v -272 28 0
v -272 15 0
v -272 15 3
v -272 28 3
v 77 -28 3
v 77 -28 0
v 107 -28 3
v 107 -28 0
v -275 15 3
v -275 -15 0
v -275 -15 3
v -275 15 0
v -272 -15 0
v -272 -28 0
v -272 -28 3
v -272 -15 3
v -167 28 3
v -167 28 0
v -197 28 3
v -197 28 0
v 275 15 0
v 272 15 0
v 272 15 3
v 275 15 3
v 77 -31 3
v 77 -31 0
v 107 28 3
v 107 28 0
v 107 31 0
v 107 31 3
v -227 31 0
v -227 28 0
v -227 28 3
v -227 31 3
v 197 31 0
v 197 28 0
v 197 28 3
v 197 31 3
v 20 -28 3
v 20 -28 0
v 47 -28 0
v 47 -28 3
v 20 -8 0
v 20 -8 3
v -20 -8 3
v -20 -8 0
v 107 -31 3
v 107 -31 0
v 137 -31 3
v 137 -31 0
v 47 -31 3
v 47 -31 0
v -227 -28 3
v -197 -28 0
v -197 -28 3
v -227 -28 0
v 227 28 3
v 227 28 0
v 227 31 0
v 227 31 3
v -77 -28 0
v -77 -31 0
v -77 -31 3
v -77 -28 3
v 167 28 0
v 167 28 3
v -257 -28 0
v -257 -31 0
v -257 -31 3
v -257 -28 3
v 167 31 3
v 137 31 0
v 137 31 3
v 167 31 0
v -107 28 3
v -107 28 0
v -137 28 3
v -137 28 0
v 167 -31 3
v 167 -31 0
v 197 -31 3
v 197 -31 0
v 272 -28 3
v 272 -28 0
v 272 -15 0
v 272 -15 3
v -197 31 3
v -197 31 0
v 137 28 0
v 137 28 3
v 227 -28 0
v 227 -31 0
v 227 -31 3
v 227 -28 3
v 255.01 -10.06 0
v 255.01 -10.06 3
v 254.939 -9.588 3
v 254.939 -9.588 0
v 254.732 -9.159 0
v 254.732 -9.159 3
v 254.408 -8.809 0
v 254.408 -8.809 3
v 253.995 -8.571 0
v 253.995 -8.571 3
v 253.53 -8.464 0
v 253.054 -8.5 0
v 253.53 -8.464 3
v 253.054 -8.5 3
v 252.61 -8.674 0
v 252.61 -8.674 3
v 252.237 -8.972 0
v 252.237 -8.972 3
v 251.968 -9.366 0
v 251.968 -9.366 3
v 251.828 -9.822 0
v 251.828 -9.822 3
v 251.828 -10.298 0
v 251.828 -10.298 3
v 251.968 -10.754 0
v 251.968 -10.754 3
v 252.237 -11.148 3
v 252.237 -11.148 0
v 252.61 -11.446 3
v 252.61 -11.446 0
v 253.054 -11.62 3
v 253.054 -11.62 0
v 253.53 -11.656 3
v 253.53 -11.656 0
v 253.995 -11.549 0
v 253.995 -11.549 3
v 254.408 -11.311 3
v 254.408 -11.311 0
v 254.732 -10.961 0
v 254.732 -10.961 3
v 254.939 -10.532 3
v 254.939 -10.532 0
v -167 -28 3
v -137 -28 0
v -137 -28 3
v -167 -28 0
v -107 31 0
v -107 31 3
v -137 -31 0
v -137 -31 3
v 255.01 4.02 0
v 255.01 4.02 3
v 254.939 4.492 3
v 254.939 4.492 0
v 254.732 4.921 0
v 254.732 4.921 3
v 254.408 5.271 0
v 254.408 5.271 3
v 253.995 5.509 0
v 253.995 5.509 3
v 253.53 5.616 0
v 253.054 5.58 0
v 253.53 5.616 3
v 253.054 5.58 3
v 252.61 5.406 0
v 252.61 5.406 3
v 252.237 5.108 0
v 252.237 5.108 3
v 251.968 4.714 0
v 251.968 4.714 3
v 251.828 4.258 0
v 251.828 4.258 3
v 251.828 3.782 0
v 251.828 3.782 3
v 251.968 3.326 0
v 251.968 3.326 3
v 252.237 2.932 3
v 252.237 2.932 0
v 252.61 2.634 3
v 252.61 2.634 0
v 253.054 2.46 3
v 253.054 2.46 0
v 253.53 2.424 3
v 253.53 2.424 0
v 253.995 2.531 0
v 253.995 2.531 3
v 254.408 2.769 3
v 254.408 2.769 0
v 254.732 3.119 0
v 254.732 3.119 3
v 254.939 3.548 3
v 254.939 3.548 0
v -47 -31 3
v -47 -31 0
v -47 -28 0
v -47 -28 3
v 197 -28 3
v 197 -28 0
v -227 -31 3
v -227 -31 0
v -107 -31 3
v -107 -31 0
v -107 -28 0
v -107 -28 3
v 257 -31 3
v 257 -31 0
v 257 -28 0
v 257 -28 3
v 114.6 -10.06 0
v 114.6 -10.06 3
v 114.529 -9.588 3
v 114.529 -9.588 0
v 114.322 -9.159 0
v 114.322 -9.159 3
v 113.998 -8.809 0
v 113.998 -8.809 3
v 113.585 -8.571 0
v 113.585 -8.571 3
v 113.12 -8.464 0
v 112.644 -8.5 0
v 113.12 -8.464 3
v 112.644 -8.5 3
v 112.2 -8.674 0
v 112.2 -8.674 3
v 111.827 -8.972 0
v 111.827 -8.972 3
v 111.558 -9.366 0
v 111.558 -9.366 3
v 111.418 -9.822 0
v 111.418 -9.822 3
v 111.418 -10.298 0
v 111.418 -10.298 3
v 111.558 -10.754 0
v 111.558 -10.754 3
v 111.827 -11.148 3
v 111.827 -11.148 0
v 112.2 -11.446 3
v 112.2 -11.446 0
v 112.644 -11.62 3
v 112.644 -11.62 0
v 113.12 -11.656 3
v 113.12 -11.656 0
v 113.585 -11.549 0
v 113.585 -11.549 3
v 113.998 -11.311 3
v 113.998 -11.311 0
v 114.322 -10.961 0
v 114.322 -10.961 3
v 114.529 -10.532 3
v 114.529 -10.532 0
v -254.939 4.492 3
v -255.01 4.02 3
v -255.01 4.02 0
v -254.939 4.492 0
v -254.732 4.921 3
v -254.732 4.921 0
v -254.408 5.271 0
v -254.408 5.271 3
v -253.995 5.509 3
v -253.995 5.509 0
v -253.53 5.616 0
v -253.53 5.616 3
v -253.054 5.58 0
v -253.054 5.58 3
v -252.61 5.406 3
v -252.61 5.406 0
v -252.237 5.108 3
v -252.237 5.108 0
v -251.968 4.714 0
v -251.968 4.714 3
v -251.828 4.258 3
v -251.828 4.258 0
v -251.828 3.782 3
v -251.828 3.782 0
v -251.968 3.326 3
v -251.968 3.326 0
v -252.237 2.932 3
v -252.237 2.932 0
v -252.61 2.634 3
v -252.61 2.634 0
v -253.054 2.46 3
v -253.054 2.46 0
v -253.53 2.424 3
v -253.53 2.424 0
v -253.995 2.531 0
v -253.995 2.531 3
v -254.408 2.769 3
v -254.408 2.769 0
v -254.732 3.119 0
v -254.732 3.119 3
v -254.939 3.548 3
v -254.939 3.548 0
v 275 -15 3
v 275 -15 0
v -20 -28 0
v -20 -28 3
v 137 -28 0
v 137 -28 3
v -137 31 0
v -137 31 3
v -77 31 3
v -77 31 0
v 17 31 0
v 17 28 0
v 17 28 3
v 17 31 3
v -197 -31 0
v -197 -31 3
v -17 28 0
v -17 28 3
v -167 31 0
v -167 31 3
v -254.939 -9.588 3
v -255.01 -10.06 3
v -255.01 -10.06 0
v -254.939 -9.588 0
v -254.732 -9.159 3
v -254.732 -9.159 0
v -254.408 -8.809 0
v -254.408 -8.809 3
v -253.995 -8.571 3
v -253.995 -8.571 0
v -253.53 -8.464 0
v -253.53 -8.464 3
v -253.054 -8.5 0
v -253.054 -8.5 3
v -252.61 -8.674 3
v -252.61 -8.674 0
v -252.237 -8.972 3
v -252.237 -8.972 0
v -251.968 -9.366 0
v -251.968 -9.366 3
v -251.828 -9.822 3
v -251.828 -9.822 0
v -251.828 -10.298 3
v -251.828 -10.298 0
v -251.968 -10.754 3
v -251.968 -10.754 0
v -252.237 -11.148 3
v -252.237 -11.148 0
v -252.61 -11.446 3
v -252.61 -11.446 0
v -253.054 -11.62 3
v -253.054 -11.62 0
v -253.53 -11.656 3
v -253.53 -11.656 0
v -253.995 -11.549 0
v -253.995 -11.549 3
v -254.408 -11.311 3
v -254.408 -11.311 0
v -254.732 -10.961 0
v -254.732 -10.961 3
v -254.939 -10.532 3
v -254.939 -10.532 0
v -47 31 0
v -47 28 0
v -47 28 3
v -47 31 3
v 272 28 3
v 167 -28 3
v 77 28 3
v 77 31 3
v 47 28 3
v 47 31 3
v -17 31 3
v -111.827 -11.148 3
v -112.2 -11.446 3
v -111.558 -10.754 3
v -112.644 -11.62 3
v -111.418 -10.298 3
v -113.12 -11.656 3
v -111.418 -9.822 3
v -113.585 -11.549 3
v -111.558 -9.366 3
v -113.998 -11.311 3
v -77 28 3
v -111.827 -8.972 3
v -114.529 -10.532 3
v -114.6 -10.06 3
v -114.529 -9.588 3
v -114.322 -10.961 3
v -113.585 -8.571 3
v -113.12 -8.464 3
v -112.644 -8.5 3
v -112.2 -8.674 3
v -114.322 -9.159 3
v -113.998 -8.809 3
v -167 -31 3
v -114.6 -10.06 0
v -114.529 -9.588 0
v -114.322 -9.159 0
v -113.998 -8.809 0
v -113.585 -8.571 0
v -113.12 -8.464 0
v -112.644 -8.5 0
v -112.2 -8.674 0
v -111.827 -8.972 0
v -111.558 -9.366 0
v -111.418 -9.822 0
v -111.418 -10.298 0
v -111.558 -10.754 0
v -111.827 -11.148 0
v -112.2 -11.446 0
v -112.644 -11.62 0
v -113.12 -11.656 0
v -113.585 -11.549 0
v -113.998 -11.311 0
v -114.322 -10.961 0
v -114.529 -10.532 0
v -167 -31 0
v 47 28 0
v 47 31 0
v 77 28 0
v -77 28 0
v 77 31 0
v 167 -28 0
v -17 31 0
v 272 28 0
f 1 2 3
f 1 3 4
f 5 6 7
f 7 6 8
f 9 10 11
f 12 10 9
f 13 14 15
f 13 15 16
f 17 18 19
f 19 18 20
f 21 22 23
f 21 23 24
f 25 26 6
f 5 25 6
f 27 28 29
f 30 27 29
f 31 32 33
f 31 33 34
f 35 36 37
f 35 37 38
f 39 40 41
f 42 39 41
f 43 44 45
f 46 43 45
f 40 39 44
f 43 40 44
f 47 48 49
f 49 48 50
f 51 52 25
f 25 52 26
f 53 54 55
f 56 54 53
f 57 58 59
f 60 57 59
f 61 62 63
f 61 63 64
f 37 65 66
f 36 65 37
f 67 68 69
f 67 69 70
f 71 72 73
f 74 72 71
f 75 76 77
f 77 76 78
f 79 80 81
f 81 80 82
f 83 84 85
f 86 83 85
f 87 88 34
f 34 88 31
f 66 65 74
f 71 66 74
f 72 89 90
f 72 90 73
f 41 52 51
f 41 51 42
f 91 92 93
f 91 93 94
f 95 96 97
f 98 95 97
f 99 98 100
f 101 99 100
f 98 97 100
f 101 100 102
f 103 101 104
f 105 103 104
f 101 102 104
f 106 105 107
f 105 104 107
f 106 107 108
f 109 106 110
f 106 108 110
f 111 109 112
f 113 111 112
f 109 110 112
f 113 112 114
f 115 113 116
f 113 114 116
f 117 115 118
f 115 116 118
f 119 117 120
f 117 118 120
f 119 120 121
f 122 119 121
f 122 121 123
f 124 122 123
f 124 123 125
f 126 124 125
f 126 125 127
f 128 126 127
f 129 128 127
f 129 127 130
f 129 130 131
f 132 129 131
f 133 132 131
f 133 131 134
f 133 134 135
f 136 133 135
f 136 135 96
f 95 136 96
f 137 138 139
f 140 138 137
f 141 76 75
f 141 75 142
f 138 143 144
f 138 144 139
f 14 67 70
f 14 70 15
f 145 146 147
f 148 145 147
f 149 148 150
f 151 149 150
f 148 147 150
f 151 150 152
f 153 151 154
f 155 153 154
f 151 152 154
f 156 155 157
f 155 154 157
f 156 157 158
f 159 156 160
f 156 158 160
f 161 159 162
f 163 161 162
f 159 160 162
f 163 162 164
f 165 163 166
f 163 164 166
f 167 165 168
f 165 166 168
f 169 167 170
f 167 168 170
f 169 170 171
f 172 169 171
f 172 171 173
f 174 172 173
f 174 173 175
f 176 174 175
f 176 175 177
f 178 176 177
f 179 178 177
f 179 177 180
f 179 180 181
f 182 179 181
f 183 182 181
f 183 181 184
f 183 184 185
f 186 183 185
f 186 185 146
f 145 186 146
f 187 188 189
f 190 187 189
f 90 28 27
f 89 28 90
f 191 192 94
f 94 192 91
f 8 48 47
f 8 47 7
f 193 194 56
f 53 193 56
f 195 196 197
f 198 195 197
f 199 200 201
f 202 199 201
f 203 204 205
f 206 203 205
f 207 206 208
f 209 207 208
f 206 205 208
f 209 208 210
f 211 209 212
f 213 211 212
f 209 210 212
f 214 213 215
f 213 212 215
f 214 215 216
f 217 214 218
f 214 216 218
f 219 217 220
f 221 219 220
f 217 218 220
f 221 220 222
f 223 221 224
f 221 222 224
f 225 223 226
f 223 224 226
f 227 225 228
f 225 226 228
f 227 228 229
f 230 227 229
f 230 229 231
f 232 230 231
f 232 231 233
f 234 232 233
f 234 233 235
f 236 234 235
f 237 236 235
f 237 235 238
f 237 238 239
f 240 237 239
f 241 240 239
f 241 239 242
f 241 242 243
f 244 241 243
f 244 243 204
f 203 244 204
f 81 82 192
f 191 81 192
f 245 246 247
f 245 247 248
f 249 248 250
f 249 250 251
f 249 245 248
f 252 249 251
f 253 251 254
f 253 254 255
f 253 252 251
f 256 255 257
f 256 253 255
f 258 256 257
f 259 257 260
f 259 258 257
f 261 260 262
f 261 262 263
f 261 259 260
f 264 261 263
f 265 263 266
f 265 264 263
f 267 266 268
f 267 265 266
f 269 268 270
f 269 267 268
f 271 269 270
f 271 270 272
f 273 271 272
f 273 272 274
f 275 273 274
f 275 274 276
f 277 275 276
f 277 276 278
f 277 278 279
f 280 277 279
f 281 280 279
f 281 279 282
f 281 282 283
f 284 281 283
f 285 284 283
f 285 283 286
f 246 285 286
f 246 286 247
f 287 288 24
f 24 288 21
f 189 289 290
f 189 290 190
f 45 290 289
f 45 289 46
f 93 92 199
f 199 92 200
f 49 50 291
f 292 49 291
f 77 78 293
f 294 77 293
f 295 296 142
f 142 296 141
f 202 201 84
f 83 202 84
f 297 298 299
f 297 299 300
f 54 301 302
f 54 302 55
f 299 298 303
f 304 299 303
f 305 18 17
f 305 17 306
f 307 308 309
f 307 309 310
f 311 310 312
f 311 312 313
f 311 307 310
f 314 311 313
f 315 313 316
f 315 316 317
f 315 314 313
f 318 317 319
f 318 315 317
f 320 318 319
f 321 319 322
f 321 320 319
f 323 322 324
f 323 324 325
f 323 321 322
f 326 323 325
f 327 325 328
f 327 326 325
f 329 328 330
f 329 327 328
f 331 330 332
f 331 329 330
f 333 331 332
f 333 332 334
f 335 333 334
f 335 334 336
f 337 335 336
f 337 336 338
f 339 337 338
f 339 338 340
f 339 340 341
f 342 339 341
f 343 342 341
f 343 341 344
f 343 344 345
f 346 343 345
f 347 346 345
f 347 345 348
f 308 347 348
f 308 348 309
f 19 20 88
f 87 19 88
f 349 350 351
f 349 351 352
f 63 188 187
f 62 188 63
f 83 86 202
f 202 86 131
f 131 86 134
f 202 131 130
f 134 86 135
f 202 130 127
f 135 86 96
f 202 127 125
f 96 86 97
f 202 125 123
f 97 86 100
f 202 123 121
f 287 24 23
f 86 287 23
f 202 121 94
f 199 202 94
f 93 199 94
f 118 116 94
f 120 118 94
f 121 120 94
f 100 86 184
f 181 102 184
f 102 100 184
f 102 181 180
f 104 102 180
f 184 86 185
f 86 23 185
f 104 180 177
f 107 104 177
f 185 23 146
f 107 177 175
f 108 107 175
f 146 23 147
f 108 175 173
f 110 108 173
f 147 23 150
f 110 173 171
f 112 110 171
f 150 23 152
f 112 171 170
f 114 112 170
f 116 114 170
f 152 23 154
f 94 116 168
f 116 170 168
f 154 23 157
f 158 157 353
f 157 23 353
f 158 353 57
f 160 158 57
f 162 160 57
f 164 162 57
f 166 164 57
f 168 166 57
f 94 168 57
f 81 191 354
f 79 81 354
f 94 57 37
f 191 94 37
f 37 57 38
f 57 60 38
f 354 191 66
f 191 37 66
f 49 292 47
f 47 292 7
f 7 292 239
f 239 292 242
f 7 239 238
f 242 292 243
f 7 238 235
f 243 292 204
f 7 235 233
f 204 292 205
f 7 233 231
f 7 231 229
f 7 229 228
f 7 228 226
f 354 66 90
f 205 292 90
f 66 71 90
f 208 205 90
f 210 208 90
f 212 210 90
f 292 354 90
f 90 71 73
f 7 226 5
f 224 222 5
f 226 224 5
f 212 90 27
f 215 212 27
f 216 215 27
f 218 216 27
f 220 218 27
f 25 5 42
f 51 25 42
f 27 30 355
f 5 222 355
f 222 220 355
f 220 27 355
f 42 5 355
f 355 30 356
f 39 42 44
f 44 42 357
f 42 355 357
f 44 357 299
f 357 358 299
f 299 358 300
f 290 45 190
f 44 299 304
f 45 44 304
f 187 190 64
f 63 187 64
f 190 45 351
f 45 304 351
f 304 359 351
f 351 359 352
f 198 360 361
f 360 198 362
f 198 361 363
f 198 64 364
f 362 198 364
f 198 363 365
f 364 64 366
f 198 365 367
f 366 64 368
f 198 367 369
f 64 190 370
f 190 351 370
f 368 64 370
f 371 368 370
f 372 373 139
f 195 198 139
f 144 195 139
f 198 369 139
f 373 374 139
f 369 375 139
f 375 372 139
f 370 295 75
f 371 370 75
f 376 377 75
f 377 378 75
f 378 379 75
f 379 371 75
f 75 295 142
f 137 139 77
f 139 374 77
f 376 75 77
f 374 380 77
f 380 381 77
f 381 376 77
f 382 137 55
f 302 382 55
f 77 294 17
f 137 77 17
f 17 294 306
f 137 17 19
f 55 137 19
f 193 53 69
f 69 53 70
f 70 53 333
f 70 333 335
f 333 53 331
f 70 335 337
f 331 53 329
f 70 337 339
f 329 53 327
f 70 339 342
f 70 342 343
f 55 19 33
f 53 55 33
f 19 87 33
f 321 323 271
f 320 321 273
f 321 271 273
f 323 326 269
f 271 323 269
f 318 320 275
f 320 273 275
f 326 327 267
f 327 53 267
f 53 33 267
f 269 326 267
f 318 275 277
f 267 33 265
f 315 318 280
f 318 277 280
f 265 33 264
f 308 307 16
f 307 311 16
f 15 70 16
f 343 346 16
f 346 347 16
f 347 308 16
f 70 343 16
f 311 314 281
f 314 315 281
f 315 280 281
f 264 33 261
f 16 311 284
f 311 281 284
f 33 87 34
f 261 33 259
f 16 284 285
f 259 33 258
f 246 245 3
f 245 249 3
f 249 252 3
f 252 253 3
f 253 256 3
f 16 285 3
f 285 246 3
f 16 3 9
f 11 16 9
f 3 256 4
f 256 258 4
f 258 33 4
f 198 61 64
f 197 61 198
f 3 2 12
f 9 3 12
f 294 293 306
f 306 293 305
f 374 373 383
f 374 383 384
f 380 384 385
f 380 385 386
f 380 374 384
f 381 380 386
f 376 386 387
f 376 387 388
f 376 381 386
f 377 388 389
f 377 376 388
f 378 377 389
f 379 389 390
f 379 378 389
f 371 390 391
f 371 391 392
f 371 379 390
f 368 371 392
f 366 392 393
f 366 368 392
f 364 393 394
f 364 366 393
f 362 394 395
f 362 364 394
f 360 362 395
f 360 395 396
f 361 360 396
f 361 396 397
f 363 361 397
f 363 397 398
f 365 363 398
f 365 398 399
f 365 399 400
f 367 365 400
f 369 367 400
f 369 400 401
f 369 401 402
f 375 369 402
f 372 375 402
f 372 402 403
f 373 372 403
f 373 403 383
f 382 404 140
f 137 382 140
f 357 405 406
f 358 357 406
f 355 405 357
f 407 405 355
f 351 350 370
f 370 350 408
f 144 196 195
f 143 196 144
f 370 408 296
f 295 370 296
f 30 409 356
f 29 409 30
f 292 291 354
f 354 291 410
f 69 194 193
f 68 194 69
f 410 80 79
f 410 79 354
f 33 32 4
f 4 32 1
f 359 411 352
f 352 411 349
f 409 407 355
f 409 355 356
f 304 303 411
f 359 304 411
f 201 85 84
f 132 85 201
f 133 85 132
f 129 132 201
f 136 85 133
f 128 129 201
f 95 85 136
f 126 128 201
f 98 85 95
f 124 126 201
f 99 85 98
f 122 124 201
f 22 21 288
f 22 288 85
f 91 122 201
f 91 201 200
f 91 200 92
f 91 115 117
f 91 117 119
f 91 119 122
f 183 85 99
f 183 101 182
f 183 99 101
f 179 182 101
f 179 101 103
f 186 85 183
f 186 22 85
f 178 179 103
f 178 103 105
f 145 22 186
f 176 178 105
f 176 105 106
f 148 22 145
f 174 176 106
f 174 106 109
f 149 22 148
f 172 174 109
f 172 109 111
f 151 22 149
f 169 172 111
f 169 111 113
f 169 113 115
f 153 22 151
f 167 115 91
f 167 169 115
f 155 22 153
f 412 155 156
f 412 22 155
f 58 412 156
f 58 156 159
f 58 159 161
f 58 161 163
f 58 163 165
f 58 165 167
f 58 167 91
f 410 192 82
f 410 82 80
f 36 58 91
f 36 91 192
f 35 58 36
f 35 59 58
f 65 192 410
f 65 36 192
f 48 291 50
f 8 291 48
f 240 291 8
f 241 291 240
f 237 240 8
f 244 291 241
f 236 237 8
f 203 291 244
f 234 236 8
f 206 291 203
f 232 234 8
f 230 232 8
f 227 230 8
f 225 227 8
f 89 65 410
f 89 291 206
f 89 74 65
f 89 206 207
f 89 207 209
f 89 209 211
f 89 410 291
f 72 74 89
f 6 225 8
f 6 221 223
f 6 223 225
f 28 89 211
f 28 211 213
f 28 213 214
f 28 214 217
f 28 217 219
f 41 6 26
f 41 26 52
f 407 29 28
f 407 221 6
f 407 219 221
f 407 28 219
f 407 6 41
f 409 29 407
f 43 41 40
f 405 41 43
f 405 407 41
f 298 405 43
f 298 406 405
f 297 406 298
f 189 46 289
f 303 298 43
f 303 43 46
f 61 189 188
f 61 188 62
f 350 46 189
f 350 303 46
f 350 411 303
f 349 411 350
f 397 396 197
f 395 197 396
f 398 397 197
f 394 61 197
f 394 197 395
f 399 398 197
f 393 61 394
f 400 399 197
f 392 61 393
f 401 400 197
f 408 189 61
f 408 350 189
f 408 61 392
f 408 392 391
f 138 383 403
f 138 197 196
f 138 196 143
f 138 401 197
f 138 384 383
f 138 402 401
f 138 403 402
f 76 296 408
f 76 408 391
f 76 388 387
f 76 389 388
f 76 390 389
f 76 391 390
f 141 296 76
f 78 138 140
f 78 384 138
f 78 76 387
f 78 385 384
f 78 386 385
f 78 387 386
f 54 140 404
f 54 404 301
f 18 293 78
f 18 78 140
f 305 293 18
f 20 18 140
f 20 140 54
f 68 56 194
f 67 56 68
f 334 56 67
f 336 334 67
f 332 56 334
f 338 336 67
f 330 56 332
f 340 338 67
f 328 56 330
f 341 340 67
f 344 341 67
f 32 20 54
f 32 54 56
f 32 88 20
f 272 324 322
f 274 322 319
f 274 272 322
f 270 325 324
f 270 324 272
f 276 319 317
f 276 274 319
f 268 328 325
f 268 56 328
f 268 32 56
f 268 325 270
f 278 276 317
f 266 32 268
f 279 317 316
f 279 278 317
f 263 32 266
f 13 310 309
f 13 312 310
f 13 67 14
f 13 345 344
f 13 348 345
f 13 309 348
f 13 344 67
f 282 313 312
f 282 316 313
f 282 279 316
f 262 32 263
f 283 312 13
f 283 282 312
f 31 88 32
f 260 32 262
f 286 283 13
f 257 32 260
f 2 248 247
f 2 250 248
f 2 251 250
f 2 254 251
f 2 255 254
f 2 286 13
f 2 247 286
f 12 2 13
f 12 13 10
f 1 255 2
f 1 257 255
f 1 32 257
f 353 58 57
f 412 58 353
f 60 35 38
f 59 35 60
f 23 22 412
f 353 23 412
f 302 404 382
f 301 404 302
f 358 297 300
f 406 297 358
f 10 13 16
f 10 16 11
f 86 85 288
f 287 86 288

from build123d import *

# Parameters (mm, degrees)
SKETCH1_W           = 272
SKETCH1_H           = 56
BOSS_EXTRUDE1_DEPTH = 3
CUT_EXTRUDE1_REACH  = 275.454
SKETCH4_R           = 1.6
SKETCH4_W           = 20
SKETCH4_H           = 20
SKETCH5_W           = 3
SKETCH5_H           = 30
SKETCH5_W_2         = 30
SKETCH5_H_2         = 3
BOSS_EXTRUDE2_DEPTH = 3


with BuildPart() as part:
    # Sketch1 → Boss-Extrude1 (new body)
    with BuildSketch(Plane.XY):
        with Locations((136, 0)):
            Rectangle(SKETCH1_W, SKETCH1_H)
    extrude(amount=BOSS_EXTRUDE1_DEPTH)

    # Sketch4 → Cut-Extrude1 (cut, up to next)
    with BuildSketch(Plane.XY.offset(3), mode=Mode.PRIVATE) as cut_extrude1_sk1:
        with Locations((253.41, -10.06)):
            Circle(SKETCH4_R)
    cut_extrude1_tool1 = extrude(cut_extrude1_sk1.sketch, amount=-CUT_EXTRUDE1_REACH, mode=Mode.PRIVATE) & part.part
    # Sketch4 → Cut-Extrude1 (cut, up to next)
    with BuildSketch(Plane.XY.offset(3), mode=Mode.PRIVATE) as cut_extrude1_sk2:
        with Locations((253.41, 4.02)):
            Circle(SKETCH4_R)
    cut_extrude1_tool2 = extrude(cut_extrude1_sk2.sketch, amount=-CUT_EXTRUDE1_REACH, mode=Mode.PRIVATE) & part.part
    # Sketch4 → Cut-Extrude1 (cut, up to next)
    with BuildSketch(Plane.XY.offset(3), mode=Mode.PRIVATE) as cut_extrude1_sk3:
        with Locations((113, -10.06)):
            Circle(SKETCH4_R)
    cut_extrude1_tool3 = extrude(cut_extrude1_sk3.sketch, amount=-CUT_EXTRUDE1_REACH, mode=Mode.PRIVATE) & part.part
    # Sketch4 → Cut-Extrude1 (cut, up to next)
    with BuildSketch(Plane.XY.offset(3), mode=Mode.PRIVATE) as cut_extrude1_sk4:
        with Locations((10, -18)):
            Rectangle(SKETCH4_W, SKETCH4_H)
    cut_extrude1_tool4 = extrude(cut_extrude1_sk4.sketch, amount=-CUT_EXTRUDE1_REACH, mode=Mode.PRIVATE) & part.part
    add(cut_extrude1_tool1.solids().sort_by_distance((253.41, -10.06, 3))[0], mode=Mode.SUBTRACT)
    add(cut_extrude1_tool2.solids().sort_by_distance((253.41, 4.02, 3))[0], mode=Mode.SUBTRACT)
    add(cut_extrude1_tool3.solids().sort_by_distance((113, -10.06, 3))[0], mode=Mode.SUBTRACT)
    add(cut_extrude1_tool4.solids().sort_by_distance((10, -18, 3))[0], mode=Mode.SUBTRACT)

    # Sketch5 → Boss-Extrude2 (add)
    with BuildSketch(Plane.XY):
        with Locations((273.5, 0)):
            Rectangle(SKETCH5_W, SKETCH5_H)
        with Locations((212, 29.5)):
            Rectangle(SKETCH5_W_2, SKETCH5_H_2)
        with Locations((152, 29.5)):
            Rectangle(SKETCH5_W_2, SKETCH5_H_2)
        with Locations((92, 29.5)):
            Rectangle(SKETCH5_W_2, SKETCH5_H_2)
        with Locations((32, 29.5)):
            Rectangle(SKETCH5_W_2, SKETCH5_H_2)
        with Locations((242, -29.5)):
            Rectangle(SKETCH5_W_2, SKETCH5_H_2)
        with Locations((182, -29.5)):
            Rectangle(SKETCH5_W_2, SKETCH5_H_2)
        with Locations((122, -29.5)):
            Rectangle(SKETCH5_W_2, SKETCH5_H_2)
        with Locations((62, -29.5)):
            Rectangle(SKETCH5_W_2, SKETCH5_H_2)
    extrude(amount=BOSS_EXTRUDE2_DEPTH)

    # Mirror1: part across plane


with BuildPart() as part_1:
    add(part.part)
    add(part.part.mirror(Plane(origin=(0, -28, 3), x_dir=(0, 0, 1), z_dir=(1, 0, 0))))


solid = part_1.part
